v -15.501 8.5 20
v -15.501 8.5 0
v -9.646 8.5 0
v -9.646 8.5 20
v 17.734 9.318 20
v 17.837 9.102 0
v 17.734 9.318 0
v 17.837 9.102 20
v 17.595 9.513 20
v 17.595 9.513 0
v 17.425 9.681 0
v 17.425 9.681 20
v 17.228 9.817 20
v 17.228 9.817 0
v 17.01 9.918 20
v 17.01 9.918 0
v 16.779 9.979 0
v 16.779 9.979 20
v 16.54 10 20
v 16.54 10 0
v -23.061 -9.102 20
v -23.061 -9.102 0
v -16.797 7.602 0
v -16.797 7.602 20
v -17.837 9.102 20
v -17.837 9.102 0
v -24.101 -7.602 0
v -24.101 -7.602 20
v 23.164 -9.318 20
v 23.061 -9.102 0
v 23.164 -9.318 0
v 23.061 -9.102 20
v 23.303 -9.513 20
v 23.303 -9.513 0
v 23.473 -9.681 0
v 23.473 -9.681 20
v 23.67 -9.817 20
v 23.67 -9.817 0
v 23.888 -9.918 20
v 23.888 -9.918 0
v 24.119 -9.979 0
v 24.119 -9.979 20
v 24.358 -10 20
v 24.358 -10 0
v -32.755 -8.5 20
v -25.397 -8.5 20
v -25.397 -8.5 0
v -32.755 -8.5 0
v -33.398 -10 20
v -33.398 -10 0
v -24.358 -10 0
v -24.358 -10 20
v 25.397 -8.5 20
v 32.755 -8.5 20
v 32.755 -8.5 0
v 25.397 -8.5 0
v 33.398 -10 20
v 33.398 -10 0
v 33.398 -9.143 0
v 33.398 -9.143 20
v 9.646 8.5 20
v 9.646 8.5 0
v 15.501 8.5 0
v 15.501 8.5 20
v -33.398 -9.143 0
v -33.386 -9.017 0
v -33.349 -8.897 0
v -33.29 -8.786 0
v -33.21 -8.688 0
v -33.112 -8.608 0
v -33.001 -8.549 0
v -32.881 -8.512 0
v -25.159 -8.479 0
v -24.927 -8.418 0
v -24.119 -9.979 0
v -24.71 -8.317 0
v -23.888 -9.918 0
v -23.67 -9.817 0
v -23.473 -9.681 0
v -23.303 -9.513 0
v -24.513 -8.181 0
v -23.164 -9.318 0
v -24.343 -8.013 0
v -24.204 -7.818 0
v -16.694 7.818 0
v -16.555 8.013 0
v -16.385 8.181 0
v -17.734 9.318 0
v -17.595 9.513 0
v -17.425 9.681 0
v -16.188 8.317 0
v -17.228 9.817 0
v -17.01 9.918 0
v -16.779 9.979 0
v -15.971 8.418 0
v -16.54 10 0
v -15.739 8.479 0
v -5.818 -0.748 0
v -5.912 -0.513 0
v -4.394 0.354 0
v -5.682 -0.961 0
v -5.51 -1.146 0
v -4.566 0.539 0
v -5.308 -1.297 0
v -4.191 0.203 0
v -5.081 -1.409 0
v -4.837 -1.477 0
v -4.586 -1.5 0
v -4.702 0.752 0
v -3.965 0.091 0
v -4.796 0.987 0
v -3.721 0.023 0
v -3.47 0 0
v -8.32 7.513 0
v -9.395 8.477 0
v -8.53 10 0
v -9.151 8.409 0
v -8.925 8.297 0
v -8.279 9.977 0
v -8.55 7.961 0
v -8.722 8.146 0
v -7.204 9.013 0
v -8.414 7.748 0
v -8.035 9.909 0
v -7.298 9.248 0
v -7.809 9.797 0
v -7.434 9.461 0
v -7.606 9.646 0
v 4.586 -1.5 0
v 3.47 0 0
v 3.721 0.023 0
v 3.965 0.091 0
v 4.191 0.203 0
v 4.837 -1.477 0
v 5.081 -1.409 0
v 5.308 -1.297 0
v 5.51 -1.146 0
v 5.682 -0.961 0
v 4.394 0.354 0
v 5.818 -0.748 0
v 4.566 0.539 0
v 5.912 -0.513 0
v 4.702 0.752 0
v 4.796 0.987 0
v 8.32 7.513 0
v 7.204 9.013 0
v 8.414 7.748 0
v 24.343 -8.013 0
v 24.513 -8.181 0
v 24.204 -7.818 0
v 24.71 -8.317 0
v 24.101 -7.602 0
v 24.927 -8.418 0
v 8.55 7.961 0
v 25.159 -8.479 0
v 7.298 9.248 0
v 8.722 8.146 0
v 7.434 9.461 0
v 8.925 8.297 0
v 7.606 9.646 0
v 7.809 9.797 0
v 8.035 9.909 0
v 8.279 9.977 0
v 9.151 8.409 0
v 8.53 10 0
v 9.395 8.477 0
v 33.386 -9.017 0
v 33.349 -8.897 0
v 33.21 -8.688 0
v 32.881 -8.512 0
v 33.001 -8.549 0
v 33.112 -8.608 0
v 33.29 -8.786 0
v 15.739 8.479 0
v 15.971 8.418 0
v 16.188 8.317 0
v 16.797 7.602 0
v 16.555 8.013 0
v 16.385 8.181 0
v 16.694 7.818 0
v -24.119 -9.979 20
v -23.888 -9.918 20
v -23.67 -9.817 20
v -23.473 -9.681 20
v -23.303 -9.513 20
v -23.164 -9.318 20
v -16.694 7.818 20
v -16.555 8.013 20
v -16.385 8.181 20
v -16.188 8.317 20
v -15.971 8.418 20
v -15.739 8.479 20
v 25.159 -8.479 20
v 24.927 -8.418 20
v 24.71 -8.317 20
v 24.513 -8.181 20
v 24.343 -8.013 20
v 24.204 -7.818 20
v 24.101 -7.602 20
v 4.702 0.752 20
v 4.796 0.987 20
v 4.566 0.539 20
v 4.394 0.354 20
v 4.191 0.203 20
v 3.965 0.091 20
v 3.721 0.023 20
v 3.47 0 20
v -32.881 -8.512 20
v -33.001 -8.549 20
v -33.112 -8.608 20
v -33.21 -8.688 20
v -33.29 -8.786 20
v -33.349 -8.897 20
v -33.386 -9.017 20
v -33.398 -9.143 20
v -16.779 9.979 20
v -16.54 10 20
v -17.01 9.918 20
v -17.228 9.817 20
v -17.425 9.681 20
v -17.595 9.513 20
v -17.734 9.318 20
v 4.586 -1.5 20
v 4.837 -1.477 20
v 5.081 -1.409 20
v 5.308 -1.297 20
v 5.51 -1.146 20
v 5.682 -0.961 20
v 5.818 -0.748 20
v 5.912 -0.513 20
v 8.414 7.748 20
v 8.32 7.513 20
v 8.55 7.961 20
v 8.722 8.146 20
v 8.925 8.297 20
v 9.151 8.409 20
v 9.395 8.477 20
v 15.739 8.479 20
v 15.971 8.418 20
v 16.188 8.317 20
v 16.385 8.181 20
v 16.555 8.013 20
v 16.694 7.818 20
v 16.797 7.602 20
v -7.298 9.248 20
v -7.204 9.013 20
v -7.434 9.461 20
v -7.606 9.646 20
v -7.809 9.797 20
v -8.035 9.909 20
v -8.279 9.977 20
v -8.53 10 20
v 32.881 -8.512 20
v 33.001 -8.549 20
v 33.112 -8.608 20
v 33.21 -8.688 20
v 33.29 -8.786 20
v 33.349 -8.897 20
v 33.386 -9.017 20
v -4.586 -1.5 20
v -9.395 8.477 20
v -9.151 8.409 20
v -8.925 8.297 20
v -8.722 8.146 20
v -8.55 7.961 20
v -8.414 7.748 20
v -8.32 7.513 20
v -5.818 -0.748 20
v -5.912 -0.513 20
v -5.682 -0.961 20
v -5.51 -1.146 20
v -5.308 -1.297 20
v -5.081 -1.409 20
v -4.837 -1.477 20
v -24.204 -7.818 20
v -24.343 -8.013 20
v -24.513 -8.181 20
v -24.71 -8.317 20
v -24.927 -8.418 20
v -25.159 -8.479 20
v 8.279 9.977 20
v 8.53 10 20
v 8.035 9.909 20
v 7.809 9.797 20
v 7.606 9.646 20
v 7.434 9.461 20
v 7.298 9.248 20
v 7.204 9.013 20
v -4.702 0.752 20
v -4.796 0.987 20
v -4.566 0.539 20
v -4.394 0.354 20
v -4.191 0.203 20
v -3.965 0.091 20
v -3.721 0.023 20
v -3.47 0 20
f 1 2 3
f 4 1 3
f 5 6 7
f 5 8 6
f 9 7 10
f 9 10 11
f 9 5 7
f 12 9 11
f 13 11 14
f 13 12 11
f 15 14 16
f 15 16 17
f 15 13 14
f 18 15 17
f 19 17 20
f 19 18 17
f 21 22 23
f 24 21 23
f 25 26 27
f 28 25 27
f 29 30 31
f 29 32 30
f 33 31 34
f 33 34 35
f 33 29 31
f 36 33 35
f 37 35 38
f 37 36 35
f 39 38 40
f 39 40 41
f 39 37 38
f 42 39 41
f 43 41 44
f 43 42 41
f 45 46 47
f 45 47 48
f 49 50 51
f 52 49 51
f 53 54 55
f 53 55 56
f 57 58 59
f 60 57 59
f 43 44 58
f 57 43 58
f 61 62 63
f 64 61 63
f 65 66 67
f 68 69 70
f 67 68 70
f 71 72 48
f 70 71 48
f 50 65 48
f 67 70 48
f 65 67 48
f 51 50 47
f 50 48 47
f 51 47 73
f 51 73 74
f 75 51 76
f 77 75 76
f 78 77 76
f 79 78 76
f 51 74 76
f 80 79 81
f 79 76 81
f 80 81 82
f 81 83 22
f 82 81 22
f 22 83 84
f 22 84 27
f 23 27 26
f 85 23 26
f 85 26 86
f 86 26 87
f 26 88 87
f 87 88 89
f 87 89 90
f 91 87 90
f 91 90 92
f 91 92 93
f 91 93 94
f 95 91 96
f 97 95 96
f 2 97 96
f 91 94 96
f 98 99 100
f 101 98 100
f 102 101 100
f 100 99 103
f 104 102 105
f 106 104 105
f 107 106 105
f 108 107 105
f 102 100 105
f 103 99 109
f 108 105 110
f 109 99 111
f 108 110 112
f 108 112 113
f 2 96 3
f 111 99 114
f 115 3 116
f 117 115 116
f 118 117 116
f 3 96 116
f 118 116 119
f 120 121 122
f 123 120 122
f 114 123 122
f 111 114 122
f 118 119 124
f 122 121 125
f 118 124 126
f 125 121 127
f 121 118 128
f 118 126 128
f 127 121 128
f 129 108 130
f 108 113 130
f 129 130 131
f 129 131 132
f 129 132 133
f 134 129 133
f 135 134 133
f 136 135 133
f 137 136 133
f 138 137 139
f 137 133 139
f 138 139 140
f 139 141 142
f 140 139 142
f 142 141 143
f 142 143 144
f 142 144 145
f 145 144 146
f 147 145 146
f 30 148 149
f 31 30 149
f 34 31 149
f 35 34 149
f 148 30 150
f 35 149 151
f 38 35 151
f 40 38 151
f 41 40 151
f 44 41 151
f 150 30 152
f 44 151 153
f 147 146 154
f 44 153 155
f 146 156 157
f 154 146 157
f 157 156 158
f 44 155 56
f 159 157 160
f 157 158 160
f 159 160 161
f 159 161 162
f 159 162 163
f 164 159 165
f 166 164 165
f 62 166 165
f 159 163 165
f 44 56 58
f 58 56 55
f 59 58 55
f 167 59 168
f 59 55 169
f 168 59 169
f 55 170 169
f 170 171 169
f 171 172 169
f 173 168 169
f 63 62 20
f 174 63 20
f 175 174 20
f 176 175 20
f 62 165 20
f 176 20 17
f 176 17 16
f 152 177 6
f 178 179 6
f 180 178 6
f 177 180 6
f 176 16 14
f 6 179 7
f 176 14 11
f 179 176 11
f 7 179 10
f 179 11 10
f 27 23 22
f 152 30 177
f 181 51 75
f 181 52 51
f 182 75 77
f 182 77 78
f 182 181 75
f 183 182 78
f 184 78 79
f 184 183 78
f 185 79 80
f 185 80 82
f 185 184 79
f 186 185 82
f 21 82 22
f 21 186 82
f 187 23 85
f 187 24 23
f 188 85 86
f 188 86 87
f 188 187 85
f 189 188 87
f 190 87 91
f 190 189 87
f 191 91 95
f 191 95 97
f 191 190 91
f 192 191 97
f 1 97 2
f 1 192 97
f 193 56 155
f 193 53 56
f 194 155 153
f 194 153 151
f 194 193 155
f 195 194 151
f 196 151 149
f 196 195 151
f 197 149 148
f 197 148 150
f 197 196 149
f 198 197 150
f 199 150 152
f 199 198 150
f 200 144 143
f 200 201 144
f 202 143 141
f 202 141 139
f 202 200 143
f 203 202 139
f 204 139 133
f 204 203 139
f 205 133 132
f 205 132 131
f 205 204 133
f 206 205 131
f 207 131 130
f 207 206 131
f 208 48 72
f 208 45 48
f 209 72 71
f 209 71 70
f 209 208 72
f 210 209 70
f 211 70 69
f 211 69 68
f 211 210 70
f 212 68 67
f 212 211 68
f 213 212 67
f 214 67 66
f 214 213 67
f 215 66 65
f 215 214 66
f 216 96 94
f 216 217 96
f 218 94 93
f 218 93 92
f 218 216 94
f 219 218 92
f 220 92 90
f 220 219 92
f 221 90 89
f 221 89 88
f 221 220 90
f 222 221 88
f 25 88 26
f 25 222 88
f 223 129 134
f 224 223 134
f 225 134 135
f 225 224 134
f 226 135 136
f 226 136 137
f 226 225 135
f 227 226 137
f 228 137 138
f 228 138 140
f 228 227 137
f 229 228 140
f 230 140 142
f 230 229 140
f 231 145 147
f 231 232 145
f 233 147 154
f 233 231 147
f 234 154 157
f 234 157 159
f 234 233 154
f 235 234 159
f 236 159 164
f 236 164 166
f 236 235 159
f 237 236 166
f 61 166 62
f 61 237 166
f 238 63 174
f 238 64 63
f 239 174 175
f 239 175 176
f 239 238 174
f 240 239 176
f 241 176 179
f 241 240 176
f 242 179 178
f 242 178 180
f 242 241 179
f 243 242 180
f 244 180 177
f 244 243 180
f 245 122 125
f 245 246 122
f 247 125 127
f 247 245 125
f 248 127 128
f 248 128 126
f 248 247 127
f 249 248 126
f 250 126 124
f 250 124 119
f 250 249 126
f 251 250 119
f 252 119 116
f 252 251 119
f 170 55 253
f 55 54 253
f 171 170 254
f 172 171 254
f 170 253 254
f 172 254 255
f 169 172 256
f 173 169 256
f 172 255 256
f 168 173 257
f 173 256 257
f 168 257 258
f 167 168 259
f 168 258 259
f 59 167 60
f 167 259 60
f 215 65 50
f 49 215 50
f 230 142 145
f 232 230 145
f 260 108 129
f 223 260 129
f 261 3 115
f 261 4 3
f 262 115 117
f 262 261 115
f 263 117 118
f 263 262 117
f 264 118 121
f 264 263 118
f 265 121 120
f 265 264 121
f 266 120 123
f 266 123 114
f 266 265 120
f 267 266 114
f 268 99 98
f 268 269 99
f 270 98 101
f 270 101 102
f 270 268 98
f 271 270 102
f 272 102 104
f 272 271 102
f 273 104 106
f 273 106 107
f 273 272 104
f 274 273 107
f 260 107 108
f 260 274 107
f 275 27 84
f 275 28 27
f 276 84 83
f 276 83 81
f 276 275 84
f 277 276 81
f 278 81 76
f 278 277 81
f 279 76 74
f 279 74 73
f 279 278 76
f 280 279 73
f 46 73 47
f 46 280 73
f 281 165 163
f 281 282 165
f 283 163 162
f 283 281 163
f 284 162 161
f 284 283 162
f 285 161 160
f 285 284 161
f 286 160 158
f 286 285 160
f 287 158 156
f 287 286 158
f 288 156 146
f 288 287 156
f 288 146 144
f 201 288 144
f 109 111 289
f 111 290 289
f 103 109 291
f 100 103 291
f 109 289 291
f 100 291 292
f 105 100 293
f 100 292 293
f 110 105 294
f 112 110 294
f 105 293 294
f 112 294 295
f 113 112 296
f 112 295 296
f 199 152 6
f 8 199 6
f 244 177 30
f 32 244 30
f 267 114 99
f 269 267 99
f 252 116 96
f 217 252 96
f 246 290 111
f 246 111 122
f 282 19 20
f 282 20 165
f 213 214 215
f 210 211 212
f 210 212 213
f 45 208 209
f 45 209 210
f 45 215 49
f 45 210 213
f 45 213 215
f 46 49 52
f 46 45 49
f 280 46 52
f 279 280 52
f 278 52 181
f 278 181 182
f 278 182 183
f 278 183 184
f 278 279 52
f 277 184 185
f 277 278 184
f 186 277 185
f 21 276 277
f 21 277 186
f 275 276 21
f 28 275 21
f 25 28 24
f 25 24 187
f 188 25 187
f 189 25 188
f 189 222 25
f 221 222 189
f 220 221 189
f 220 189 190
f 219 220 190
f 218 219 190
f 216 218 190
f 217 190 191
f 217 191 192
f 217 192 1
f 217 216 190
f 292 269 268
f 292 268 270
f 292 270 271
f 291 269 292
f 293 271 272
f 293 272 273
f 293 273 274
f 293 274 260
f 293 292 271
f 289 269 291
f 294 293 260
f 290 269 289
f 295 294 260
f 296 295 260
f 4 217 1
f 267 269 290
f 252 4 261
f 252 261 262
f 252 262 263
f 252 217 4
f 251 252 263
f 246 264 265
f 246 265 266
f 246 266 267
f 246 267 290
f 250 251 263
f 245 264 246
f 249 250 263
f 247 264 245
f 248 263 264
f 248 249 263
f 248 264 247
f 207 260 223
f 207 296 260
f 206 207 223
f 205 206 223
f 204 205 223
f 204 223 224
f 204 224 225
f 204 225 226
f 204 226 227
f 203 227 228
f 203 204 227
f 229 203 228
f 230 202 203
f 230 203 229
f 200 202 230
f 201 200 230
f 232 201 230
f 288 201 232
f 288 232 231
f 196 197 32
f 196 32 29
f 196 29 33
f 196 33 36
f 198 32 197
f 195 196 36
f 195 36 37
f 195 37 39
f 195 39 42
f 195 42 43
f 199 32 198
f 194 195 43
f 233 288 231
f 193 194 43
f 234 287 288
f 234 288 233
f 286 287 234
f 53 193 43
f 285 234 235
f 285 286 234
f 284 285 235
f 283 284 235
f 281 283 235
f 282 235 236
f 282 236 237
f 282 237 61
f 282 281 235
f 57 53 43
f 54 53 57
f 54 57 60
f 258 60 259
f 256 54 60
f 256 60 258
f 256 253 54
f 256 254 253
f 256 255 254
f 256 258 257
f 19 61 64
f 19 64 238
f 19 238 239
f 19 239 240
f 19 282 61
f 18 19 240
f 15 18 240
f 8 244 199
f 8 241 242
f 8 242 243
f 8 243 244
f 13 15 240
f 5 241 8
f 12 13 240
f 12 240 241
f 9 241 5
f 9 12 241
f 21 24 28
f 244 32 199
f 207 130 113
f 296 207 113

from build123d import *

# Parameters (mm, degrees)
F1_DEPTH = 20
F2_R     = 1.3846892623
F3_R     = 0.6428654195


# Not quite as in the source:
# - a feature names something its author has since deleted; it is built from what else it names


with BuildPart() as f1:
    # F0 (on Top) → F1 (new body)
    with BuildSketch(Plane.XY):
        Polygon((0, -1.5), (0, 0), (-4.5, 0), (-7.5, 10), (-17.5, 10), (-24.4375, -8.5), (-33.3979992978, -8.5), (-33.3979992978, -10), (-25, -10), (-23.3979992978, -10), (-16.4604992978, 8.5), (-8.6160459763, 8.5), (-5.6160459763, -1.5), align=None)
        Polygon((4.5, 0), (0, 0), (0, -1.5), (5.6160459763, -1.5), (8.6160459763, 8.5), (16.4604992978, 8.5), (23.3979992978, -10), (33.3979992978, -10), (33.3979992978, -8.5), (24.4375, -8.5), (17.5, 10), (7.5, 10), align=None)
    extrude(amount=F1_DEPTH)

    # F2
    f2_edges = [f1.edges().sort_by_distance(p)[0] for p in [
        (-7.5, 10, 10),
        (-4.5, 0, 10),
        (-17.5, 10, 10),
        (-16.460499, 8.5, 10),
        (-8.616046, 8.5, 10),
        (-5.616046, -1.5, 10),
        (17.5, 10, 10),
        (7.5, 10, 10),
        (4.5, 0, 10),
        (24.4375, -8.5, 10),
        (-24.4375, -8.5, 10),
        (5.616046, -1.5, 10),
        (8.616046, 8.5, 10),
        (16.460499, 8.5, 10),
        (23.397999, -10, 10),
        (-23.397999, -10, 10),
    ]]
    fillet(f2_edges, radius=F2_R)

    # F3
    f3_edges = [f1.edges().sort_by_distance(p)[0] for p in [
        (-33.397999, -8.5, 10),
        (33.397999, -8.5, 10),
    ]]
    fillet(f3_edges, radius=F3_R)


solid = f1.part
